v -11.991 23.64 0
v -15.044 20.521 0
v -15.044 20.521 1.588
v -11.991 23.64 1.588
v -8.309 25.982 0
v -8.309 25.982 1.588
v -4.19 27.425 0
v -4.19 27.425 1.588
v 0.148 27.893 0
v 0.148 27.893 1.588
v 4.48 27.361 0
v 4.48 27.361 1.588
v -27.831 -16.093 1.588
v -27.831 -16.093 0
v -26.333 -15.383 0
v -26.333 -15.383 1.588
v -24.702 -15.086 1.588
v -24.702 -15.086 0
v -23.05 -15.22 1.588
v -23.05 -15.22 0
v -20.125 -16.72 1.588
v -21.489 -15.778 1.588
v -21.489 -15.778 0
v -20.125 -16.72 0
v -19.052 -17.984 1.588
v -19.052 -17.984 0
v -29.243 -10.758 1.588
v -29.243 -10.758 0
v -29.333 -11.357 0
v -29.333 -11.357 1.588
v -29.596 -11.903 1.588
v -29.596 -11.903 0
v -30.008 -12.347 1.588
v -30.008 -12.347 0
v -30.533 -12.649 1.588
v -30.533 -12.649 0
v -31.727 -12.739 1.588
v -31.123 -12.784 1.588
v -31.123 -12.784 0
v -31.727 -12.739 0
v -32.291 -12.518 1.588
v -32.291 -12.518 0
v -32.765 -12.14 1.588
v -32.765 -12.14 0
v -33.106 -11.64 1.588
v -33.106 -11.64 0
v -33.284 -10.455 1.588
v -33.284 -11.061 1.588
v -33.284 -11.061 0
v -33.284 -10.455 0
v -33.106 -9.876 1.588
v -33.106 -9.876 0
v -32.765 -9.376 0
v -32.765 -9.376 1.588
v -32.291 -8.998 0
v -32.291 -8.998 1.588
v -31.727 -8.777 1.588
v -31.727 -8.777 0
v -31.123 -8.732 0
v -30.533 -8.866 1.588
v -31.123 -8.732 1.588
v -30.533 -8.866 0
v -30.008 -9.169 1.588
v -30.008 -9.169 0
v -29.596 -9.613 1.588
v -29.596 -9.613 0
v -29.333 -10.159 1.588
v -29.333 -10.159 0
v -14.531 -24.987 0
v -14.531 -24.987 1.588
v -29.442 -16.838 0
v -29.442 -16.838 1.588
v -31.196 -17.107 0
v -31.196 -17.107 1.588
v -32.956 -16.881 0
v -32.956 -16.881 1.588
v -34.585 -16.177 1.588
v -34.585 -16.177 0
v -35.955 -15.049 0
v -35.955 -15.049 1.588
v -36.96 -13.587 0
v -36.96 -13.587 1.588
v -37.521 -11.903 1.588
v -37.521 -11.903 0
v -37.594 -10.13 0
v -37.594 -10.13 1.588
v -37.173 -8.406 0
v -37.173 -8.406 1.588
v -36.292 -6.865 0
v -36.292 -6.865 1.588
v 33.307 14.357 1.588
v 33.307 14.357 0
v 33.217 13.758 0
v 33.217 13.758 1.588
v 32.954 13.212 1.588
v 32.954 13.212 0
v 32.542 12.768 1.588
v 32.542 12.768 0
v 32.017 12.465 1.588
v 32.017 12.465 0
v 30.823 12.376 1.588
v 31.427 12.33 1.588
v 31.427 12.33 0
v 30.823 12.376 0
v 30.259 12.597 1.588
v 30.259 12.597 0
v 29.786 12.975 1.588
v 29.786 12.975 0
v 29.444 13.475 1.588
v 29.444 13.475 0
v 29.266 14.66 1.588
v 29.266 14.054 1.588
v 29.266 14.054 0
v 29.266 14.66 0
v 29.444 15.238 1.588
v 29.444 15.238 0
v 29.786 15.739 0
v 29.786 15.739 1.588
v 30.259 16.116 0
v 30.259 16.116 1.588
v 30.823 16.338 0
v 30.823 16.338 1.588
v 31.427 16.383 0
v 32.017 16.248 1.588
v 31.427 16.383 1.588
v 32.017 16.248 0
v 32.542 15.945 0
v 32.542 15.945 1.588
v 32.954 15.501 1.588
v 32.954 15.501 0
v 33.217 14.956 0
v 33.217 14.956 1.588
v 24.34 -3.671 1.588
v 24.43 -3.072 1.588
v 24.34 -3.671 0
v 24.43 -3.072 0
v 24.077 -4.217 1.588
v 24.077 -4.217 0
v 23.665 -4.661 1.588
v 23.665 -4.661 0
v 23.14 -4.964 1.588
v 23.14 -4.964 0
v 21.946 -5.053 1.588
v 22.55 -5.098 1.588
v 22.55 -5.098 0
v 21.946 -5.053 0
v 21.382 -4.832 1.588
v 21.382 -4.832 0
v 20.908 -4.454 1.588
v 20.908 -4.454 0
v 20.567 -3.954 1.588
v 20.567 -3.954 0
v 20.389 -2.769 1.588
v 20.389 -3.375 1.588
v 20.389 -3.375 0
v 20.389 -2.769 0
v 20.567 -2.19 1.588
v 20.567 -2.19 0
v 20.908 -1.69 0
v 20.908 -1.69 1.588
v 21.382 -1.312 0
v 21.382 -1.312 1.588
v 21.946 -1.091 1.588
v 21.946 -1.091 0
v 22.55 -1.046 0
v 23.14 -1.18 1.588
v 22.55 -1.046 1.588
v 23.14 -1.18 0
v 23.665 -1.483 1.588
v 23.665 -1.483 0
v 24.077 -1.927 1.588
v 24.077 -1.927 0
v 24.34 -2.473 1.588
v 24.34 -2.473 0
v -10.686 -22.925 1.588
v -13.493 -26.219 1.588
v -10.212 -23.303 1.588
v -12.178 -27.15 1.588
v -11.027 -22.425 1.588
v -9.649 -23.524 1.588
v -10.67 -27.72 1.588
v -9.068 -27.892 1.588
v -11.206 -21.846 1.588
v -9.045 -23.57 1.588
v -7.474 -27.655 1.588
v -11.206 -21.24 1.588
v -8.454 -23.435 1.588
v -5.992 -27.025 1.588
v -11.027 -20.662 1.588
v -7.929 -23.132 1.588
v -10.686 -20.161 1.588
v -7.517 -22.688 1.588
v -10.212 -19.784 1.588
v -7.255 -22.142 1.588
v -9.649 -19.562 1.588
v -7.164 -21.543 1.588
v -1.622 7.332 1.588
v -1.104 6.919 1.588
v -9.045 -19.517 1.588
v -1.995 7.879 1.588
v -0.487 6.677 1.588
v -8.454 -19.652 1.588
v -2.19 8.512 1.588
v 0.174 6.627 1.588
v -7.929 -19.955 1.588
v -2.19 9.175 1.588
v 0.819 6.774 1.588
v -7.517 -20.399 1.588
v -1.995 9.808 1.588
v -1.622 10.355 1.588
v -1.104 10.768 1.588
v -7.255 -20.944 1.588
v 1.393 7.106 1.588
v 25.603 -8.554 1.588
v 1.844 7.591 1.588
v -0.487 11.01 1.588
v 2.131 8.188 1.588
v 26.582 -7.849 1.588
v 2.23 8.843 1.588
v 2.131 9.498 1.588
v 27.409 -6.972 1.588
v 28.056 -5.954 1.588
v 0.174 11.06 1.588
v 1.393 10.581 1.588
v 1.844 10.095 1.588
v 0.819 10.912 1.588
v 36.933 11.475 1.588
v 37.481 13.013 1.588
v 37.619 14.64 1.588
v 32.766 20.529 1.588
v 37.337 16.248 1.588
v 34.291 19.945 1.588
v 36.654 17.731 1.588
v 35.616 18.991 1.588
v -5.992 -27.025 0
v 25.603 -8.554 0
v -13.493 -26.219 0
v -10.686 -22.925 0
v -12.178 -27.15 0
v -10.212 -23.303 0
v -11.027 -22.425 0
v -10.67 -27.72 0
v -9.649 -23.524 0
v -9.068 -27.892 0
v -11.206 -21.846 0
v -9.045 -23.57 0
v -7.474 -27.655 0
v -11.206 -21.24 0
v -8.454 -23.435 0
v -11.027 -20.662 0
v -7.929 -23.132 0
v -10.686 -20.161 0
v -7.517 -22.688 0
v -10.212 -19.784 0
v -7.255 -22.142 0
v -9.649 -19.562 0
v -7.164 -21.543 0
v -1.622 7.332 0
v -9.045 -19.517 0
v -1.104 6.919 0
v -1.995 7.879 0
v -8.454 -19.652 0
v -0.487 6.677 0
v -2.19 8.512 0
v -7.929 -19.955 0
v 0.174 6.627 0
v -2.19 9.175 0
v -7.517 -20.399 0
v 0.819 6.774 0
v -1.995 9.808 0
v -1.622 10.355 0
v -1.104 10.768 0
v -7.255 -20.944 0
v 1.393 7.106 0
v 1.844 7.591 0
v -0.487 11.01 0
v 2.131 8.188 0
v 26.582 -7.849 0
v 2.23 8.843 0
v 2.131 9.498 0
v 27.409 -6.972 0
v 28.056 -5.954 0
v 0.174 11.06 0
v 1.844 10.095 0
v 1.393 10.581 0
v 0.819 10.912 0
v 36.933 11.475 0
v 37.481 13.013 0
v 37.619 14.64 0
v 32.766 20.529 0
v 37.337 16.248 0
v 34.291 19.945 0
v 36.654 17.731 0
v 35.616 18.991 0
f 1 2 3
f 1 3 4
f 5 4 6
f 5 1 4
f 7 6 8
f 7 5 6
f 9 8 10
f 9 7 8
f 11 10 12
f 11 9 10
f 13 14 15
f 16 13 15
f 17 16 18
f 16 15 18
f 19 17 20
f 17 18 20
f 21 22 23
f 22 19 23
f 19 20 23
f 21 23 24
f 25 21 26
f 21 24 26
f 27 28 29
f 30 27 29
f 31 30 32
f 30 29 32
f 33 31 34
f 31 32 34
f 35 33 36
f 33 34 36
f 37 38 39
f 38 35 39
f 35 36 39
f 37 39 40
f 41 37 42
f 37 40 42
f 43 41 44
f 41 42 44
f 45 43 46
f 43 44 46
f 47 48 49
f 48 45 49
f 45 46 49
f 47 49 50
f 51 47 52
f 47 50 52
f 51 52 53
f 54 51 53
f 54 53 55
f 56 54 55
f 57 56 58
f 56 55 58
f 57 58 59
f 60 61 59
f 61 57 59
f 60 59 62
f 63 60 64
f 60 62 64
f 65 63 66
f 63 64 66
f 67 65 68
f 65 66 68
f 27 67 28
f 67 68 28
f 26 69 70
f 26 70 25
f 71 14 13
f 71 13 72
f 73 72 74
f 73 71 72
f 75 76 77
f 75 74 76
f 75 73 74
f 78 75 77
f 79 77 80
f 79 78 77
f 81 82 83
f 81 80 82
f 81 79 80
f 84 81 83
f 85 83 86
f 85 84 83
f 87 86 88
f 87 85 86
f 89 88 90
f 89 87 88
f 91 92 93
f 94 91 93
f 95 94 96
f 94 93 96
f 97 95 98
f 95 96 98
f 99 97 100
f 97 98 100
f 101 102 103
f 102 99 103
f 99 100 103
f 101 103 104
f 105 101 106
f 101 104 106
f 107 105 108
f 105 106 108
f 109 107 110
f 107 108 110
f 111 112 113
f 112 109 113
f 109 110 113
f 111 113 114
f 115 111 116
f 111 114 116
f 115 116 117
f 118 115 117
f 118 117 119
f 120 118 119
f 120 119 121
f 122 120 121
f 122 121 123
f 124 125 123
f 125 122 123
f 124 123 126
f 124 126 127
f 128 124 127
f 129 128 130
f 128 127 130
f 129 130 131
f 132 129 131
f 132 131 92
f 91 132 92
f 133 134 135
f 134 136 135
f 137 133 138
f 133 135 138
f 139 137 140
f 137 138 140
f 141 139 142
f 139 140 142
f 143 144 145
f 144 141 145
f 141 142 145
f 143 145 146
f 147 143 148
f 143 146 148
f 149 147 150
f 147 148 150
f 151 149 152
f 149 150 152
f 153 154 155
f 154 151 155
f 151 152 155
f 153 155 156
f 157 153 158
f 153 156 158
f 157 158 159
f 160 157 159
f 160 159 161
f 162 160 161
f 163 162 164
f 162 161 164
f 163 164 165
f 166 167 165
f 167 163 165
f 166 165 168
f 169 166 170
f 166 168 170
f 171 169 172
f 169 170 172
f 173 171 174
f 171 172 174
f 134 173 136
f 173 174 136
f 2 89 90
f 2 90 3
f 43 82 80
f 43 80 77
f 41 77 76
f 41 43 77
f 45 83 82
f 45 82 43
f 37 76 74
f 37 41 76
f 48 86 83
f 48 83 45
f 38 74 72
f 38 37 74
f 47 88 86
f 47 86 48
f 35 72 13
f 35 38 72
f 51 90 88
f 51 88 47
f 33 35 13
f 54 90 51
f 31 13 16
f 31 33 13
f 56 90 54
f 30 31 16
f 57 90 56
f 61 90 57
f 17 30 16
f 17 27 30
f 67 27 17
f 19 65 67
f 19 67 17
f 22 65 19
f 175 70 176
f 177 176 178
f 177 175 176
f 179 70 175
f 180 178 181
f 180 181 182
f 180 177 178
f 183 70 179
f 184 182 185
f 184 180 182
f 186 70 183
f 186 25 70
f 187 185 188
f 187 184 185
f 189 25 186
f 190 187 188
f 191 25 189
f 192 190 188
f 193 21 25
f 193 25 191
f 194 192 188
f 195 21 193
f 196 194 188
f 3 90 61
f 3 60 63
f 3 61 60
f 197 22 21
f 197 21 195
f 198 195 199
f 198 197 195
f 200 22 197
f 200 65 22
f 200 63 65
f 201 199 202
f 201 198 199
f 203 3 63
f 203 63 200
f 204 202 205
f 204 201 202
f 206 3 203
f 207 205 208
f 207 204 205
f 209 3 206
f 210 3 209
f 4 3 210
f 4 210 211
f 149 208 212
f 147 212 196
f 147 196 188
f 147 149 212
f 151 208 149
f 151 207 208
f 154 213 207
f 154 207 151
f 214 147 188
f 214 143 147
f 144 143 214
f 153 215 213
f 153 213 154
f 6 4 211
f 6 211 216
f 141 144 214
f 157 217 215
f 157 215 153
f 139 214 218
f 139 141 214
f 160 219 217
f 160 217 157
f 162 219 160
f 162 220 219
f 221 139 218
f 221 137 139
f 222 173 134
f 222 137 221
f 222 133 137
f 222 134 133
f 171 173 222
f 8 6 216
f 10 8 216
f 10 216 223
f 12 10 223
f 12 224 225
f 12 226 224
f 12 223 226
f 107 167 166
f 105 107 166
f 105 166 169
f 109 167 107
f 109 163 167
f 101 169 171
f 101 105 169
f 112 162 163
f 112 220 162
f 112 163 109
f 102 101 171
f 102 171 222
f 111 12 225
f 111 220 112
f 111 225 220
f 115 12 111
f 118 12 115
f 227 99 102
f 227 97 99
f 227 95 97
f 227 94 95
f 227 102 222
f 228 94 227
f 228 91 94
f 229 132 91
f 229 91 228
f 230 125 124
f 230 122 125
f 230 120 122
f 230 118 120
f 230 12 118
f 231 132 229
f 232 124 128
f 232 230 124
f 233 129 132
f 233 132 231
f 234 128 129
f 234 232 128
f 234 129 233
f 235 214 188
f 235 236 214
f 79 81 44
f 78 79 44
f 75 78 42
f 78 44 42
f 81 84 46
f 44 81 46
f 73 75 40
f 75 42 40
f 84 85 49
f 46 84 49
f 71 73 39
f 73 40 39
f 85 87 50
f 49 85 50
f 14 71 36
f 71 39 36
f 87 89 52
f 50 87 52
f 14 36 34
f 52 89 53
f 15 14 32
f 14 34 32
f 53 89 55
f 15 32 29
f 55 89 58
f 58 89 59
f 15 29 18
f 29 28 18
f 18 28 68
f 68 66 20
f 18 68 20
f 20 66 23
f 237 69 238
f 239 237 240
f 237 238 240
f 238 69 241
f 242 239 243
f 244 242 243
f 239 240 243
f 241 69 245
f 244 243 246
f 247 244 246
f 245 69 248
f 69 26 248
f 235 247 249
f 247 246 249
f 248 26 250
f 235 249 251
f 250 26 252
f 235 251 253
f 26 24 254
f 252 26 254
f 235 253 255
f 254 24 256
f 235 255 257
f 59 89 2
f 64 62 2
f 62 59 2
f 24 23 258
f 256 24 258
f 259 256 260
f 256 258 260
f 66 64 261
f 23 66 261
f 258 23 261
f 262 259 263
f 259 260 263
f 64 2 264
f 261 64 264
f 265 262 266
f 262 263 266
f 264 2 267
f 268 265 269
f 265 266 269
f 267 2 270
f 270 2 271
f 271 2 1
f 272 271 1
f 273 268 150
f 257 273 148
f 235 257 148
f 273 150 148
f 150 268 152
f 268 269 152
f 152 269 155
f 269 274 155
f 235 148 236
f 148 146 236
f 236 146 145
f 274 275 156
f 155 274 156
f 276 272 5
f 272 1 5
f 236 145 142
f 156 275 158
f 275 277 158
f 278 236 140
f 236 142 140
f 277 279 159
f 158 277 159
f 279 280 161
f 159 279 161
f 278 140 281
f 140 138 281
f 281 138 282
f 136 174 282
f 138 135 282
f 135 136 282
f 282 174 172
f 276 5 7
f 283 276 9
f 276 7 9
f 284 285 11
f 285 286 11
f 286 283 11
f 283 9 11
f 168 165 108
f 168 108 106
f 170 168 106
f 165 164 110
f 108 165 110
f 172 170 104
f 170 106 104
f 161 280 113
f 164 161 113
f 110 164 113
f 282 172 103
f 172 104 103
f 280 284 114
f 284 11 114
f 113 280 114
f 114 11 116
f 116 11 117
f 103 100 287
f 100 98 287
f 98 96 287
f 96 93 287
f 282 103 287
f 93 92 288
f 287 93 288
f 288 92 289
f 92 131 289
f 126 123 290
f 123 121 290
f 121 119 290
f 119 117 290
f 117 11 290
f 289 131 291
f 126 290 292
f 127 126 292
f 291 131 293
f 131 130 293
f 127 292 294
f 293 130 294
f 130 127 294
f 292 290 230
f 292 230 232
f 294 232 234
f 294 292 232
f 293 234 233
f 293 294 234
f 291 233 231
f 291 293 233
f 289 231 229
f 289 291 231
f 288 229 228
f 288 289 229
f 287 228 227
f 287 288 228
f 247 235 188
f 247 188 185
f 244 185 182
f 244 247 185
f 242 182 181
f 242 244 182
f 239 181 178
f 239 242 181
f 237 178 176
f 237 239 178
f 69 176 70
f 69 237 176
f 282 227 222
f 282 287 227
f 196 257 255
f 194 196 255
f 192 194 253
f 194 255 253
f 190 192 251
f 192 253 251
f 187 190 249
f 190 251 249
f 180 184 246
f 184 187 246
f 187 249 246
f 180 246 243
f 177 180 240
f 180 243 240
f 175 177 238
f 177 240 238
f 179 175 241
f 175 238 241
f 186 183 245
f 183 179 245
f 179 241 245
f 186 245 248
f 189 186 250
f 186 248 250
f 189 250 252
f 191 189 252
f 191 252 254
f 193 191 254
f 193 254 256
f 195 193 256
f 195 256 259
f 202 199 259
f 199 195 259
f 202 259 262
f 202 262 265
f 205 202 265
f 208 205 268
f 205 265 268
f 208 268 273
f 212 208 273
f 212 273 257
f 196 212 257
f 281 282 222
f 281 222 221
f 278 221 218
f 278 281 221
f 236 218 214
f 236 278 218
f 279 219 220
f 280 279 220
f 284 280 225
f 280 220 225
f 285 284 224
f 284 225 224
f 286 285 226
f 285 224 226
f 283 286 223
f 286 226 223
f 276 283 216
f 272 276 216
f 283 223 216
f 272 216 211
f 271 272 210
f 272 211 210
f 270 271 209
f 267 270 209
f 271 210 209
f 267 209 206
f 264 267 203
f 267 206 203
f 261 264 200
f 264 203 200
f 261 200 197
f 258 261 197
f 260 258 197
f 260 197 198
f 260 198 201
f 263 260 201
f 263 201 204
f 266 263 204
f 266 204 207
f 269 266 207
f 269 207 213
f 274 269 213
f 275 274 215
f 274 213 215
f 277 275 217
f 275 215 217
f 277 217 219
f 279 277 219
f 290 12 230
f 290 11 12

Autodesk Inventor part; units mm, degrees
ref_plane "YZ Plane" through (0, 0, 0) normal (1, 0, 0) x (0, 1, 0)
ref_plane "XZ Plane" through (0, 0, 0) normal (0, 1, 0) x (-1, 0, 0)
ref_plane "Work Plane1" through (0, 0, 0) normal (0, 0, 1) x (1, 0, 0)
sketch "Sketch1" plane through (0, 0, 0) normal (0, 0, 1) x (1, 0, 0)
  circle A0 centre (31.2751, 14.3567) radius 2.032
  circle A1 centre (-31.2751, -10.7579) radius 2.032
  circle A2 centre (-9.1964, -21.5433) radius 2.032
  line L0 (4.4799, 27.3609) -> (32.7659, 20.5292)
  arc A3 (4.4799, 27.3609) -> (-15.0435, 20.5211) centre (0.0075, 8.8433) ccw
  line L1 (-36.2921, -6.8653) -> (-15.0435, 20.5211)
  arc A4 (-36.2921, -6.8653) -> (-27.8312, -16.0929) centre (-31.2751, -10.7579) ccw
  arc A5 (-19.0523, -17.9839) -> (-27.8312, -16.0929) centre (-24.3873, -21.4279) ccw
  line L2 (-14.5314, -24.9873) -> (-19.0523, -17.9839)
  arc A6 (36.9334, 11.4747) -> (32.7659, 20.5292) centre (31.2751, 14.3567) ccw
  arc A7 (-14.5314, -24.9873) -> (-5.9915, -27.0252) centre (-9.1964, -21.5433) ccw
  arc A8 (25.6029, -8.5539) -> (28.0563, -5.954) centre (22.398, -3.072) ccw
  circle A9 centre (22.398, -3.072) radius 2.032
  line L3 (36.9334, 11.4747) -> (28.0563, -5.954)
  line L4 (25.6029, -8.5539) -> (-5.9915, -27.0252)
  line L5 (72.5061, 7.5054) -> (72.5061, 11.8054)
  circle A10 centre (0.0075, 8.8433) radius 2.2225
  point P0 (0, 0)
  dimension "d14" = 4.064
  dimension "d17" = 4.445
extrude "Plate3" add sketch "Sketch1" along normal blind 1.5875 contours L0 A6 L3 A8 L4 A7 L2 A5 A4 L1 A3 | A10
sketch "Sketch2" plane through (0, 0, 1.5875) normal (0, 0, 1) x (1, 0, 0)
  arc A0 (4.4799, 27.3609) -> (-15.0435, 20.5211) centre (0.0075, 8.8433) ccw projected
  line L0 (4.4799, 27.3609) -> (32.7659, 20.5292) projected
  arc A1 (36.9334, 11.4747) -> (32.7659, 20.5292) centre (31.2751, 14.3567) ccw projected
  line L1 (36.9334, 11.4747) -> (28.0563, -5.954) projected
  arc A2 (25.6029, -8.5539) -> (28.0563, -5.954) centre (22.398, -3.072) ccw projected
  line L2 (25.6029, -8.5539) -> (-5.9915, -27.0252) projected
  arc A3 (-14.5314, -24.9873) -> (-5.9915, -27.0252) centre (-9.1964, -21.5433) ccw projected
  line L3 (-14.5314, -24.9873) -> (-19.0523, -17.9839) projected
  arc A4 (-19.0523, -17.9839) -> (-27.8312, -16.0929) centre (-24.3873, -21.4279) ccw projected
  arc A5 (-36.2921, -6.8653) -> (-27.8312, -16.0929) centre (-31.2751, -10.7579) ccw projected
  line L4 (-36.2921, -6.8653) -> (-15.0435, 20.5211) projected
  circle A6 centre (31.2751, 14.3567) radius 2.032 projected
  circle A7 centre (22.398, -3.072) radius 2.032 projected
  circle A8 centre (-9.1964, -21.5433) radius 2.032 projected
  circle A9 centre (-31.2751, -10.7579) radius 2.032 projected
  circle A10 centre (0.0075, 8.8433) radius 2.2225
  point P0 (0, 0)
  dimension "d16" = 4.445
extrude "Extrusion1" cut sketch "Sketch2" against normal blind 15.875 contours A10
equation "\"d15\" = Thickness"
equation "\"BendRadius\" = Thickness"
equation "\"BendReliefWidth\" = Thickness"
equation "\"BendReliefDepth\" = 0.5 * Thickness"
equation "\"CornerReliefSize\" = 4 * Thickness"
equation "\"MinimumRemnant\" = 2 * Thickness"
equation "\"TransitionRadius\" = BendRadius"
equation "\"JacobiRadiusSize\" = BendRadius"
equation "\"GapSize\" = Thickness"
equation "\"Thickness\" = 1.5875"
properties part number "Front Horizontal Odom Pod Rot Side" material "Acetal Resin, White"
